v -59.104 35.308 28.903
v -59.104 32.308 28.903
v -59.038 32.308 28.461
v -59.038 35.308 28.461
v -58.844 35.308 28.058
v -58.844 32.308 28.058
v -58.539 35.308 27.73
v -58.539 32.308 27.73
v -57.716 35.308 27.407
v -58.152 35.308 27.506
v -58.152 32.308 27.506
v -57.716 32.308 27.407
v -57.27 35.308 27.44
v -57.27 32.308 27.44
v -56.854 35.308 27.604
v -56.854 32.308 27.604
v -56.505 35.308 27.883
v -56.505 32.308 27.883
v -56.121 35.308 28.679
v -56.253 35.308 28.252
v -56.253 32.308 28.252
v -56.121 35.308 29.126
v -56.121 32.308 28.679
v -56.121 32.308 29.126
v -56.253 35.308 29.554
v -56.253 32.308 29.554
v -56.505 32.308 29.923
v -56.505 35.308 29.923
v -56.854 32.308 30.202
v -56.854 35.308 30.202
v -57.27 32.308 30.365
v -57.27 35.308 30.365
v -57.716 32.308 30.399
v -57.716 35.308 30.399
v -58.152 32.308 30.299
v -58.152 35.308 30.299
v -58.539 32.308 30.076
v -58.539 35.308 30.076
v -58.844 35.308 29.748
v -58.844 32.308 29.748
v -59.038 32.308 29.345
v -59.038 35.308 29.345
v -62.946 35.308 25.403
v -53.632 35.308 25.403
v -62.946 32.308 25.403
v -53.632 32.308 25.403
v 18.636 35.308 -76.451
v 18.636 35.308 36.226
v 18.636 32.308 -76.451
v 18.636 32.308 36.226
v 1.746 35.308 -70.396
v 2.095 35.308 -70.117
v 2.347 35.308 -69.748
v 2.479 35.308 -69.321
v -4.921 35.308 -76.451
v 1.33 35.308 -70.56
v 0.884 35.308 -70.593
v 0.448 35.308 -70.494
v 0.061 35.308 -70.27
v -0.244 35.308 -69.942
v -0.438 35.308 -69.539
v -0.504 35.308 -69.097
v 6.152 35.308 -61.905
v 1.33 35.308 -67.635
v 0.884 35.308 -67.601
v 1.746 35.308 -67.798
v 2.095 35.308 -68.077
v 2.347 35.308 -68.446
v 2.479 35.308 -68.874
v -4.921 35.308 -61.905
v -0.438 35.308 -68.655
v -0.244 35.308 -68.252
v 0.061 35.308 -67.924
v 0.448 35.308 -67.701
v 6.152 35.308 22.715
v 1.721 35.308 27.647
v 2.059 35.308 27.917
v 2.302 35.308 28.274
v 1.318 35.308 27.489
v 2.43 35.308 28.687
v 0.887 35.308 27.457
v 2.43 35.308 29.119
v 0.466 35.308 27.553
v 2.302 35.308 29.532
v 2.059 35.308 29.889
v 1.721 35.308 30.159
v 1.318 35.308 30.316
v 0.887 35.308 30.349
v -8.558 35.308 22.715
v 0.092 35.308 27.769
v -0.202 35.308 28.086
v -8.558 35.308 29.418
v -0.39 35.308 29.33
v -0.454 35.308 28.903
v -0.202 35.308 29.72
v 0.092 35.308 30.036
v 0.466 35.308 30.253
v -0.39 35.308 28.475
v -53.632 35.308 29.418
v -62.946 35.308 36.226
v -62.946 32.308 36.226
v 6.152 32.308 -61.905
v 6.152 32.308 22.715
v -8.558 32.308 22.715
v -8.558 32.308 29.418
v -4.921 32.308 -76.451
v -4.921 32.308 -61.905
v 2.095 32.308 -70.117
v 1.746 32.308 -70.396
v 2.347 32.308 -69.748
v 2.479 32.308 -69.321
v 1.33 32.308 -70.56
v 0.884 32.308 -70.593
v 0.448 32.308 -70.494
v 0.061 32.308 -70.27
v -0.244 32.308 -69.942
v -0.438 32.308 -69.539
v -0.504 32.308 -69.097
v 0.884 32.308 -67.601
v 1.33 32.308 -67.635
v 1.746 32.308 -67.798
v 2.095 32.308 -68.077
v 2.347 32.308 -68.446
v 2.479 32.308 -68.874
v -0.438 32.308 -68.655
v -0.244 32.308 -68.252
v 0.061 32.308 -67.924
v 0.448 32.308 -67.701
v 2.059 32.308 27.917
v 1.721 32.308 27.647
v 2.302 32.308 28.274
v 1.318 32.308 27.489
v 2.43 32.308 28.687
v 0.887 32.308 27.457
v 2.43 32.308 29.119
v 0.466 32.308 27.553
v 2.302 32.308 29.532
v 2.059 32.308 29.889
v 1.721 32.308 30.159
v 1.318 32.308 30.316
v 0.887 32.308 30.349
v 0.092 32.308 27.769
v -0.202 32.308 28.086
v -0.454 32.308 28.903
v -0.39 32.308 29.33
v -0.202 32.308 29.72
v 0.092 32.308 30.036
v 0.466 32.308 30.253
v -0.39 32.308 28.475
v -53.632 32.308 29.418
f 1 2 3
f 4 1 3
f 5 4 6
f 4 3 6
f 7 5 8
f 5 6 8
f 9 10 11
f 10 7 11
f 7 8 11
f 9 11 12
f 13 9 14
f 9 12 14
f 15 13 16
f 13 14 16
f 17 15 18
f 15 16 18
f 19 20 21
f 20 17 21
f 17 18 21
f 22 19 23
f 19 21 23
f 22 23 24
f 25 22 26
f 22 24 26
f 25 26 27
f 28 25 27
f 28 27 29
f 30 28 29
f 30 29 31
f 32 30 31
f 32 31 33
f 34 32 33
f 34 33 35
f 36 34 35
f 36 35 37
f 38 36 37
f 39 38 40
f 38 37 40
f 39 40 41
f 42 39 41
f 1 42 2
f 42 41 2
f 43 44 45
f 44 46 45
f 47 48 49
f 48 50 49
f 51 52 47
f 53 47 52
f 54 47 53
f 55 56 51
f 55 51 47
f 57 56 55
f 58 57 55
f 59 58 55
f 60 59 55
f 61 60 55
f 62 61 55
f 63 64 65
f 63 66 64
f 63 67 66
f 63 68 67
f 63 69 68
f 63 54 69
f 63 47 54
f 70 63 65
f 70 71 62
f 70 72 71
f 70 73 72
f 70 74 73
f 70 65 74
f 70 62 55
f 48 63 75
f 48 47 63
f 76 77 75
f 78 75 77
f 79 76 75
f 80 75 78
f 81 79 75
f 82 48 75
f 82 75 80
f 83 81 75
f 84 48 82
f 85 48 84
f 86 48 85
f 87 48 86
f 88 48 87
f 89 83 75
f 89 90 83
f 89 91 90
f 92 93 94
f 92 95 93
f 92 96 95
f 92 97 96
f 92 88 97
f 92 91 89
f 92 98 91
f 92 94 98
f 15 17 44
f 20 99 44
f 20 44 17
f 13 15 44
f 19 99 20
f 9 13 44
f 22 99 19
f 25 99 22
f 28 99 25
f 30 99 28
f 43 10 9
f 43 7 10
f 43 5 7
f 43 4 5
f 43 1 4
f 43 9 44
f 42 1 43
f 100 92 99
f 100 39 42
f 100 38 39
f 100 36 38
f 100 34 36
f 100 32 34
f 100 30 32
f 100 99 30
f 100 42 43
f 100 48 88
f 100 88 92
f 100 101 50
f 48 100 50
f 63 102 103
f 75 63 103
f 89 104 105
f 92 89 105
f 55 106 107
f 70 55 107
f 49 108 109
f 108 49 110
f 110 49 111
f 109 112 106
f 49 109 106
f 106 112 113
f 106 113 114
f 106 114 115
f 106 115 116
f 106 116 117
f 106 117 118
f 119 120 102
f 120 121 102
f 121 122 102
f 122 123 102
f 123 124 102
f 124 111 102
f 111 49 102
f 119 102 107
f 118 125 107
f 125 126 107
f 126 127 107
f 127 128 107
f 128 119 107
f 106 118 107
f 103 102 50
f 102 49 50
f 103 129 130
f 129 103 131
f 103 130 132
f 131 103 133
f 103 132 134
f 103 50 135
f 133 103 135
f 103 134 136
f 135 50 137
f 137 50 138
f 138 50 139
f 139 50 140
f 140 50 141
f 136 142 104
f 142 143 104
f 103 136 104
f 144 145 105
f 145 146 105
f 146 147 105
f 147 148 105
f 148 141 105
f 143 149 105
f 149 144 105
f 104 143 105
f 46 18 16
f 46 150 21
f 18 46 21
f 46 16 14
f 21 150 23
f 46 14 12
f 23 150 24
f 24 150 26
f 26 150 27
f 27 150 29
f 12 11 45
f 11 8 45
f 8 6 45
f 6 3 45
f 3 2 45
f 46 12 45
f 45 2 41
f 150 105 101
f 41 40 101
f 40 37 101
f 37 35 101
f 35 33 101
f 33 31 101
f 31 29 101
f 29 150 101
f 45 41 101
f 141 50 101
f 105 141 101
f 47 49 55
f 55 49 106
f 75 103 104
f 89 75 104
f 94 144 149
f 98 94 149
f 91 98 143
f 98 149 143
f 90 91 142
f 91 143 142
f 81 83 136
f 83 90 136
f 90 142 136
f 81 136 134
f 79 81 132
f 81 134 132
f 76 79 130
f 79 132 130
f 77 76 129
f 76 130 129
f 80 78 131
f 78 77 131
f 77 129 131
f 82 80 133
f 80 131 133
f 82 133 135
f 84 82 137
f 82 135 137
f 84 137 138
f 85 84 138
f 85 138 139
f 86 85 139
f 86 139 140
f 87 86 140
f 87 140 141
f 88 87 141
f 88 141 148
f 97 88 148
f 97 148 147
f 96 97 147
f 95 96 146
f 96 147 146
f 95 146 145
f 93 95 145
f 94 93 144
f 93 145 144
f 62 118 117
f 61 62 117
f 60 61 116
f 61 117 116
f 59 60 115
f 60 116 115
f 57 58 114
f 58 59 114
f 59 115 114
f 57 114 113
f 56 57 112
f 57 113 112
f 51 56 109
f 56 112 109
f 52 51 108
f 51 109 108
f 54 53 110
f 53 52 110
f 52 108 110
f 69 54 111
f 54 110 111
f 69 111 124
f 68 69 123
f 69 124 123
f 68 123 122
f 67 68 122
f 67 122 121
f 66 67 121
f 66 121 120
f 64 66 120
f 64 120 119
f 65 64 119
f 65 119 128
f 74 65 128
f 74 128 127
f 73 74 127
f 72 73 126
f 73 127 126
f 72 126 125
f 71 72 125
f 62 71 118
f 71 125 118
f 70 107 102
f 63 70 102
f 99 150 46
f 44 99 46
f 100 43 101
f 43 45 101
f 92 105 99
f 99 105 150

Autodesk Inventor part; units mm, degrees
ref_plane "YZ Plane" through (0, 0, 0) normal (1, 0, 0) x (0, 1, 0)
ref_plane "XZ Plane" through (0, 0, 0) normal (0, 1, 0) x (-1, 0, 0)
ref_plane "XY Plane" through (0, 0, 0) normal (0, 0, 1) x (1, 0, 0)
ref_plane "Work Plane1" through (-100.0042, 32.3083, -20.5972) normal (0, 1, 0) x (-1, 0, 0)
sketch "Sketch2" plane through (-100.0042, 32.3083, -20.5972) normal (0, 1, 0) x (-1, 0, 0)
  line L0 (-37.0577, 56.8227) -> (-118.6401, 56.8227)
  line L1 (-118.6401, 56.8227) -> (-118.6401, -55.8539)
  line L2 (-118.6401, -55.8539) -> (-95.0834, -55.8539)
  line L3 (-95.0834, -55.8539) -> (-95.0834, -41.3074)
  line L4 (-95.0834, -41.3074) -> (-106.1561, -41.3074)
  line L5 (-106.1561, -41.3074) -> (-106.1561, 43.3122)
  line L6 (-106.1561, 43.3122) -> (-91.4467, 43.3122)
  line L7 (-105, 46) -> (-105, -52.5) projected
  line L8 (-105, -52.5) -> (105, -52.5) projected
  line L9 (105, -52.5) -> (105, 52.5) projected
  line L10 (105, 52.5) -> (-93, 52.5) projected
  line L11 (-93, 52.5) -> (-93, 48) projected
  arc A0 (-95, 46) -> (-93, 48) centre (-95, 48) ccw projected
  line L12 (-95, 46) -> (-105, 46) projected
  circle A1 centre (-101, -48.5) radius 1.5 projected
  circle A2 centre (101, -48.5) radius 2 projected
  circle A3 centre (101, 27.5) radius 2 projected
  circle A4 centre (-42.4, 49.5) radius 1.5 projected
  circle A5 centre (-101, -48.5) radius 1.5 projected
  circle A6 centre (-101, -48.5) radius 1.5 projected
  circle A7 centre (-101, -48.5) radius 1.5 projected
  circle A8 centre (-101, -48.5) radius 1.5 projected
  circle A9 centre (-101, -48.5) radius 1.5 projected
  circle A10 centre (-101, -48.5) radius 1.5 projected
  circle A11 centre (-101, -48.5) radius 1.5 projected
  circle A12 centre (-101, -48.5) radius 1.5 projected
  circle A13 centre (-101, -48.5) radius 1.5 projected
  circle A14 centre (-101, -48.5) radius 1.45
  circle A15 centre (-101, 49.5) radius 1.45
  line L13 (-91.4467, 50.0155) -> (-46.3722, 50.0155)
  line L14 (-46.3722, 50.0155) -> (-46.3722, 46)
  line L15 (-46.3722, 46) -> (-37.0577, 46)
  line L16 (-37.0577, 46) -> (-37.0577, 56.8227)
  line L17 (-91.4467, 43.3122) -> (-91.4467, 50.0155)
  circle A16 centre (-42.4, 49.5) radius 1.5
  point P0 (-100.0042, 20.5972)
  point P1 (-37.0577, 56.8227)
  dimension "d2" = 2.9
extrude "Extrusion1" add sketch "Sketch2" along normal blind 3 contours L16 L10 L11 A0 L12 L7 L6 L5 L4 L8 L3 L2 L1 L0 | L16 L15 L14 L13 L17 L6 L7 L12 A0 L11 L10 | L8 L7 L4 L3
properties part number "strut1"
